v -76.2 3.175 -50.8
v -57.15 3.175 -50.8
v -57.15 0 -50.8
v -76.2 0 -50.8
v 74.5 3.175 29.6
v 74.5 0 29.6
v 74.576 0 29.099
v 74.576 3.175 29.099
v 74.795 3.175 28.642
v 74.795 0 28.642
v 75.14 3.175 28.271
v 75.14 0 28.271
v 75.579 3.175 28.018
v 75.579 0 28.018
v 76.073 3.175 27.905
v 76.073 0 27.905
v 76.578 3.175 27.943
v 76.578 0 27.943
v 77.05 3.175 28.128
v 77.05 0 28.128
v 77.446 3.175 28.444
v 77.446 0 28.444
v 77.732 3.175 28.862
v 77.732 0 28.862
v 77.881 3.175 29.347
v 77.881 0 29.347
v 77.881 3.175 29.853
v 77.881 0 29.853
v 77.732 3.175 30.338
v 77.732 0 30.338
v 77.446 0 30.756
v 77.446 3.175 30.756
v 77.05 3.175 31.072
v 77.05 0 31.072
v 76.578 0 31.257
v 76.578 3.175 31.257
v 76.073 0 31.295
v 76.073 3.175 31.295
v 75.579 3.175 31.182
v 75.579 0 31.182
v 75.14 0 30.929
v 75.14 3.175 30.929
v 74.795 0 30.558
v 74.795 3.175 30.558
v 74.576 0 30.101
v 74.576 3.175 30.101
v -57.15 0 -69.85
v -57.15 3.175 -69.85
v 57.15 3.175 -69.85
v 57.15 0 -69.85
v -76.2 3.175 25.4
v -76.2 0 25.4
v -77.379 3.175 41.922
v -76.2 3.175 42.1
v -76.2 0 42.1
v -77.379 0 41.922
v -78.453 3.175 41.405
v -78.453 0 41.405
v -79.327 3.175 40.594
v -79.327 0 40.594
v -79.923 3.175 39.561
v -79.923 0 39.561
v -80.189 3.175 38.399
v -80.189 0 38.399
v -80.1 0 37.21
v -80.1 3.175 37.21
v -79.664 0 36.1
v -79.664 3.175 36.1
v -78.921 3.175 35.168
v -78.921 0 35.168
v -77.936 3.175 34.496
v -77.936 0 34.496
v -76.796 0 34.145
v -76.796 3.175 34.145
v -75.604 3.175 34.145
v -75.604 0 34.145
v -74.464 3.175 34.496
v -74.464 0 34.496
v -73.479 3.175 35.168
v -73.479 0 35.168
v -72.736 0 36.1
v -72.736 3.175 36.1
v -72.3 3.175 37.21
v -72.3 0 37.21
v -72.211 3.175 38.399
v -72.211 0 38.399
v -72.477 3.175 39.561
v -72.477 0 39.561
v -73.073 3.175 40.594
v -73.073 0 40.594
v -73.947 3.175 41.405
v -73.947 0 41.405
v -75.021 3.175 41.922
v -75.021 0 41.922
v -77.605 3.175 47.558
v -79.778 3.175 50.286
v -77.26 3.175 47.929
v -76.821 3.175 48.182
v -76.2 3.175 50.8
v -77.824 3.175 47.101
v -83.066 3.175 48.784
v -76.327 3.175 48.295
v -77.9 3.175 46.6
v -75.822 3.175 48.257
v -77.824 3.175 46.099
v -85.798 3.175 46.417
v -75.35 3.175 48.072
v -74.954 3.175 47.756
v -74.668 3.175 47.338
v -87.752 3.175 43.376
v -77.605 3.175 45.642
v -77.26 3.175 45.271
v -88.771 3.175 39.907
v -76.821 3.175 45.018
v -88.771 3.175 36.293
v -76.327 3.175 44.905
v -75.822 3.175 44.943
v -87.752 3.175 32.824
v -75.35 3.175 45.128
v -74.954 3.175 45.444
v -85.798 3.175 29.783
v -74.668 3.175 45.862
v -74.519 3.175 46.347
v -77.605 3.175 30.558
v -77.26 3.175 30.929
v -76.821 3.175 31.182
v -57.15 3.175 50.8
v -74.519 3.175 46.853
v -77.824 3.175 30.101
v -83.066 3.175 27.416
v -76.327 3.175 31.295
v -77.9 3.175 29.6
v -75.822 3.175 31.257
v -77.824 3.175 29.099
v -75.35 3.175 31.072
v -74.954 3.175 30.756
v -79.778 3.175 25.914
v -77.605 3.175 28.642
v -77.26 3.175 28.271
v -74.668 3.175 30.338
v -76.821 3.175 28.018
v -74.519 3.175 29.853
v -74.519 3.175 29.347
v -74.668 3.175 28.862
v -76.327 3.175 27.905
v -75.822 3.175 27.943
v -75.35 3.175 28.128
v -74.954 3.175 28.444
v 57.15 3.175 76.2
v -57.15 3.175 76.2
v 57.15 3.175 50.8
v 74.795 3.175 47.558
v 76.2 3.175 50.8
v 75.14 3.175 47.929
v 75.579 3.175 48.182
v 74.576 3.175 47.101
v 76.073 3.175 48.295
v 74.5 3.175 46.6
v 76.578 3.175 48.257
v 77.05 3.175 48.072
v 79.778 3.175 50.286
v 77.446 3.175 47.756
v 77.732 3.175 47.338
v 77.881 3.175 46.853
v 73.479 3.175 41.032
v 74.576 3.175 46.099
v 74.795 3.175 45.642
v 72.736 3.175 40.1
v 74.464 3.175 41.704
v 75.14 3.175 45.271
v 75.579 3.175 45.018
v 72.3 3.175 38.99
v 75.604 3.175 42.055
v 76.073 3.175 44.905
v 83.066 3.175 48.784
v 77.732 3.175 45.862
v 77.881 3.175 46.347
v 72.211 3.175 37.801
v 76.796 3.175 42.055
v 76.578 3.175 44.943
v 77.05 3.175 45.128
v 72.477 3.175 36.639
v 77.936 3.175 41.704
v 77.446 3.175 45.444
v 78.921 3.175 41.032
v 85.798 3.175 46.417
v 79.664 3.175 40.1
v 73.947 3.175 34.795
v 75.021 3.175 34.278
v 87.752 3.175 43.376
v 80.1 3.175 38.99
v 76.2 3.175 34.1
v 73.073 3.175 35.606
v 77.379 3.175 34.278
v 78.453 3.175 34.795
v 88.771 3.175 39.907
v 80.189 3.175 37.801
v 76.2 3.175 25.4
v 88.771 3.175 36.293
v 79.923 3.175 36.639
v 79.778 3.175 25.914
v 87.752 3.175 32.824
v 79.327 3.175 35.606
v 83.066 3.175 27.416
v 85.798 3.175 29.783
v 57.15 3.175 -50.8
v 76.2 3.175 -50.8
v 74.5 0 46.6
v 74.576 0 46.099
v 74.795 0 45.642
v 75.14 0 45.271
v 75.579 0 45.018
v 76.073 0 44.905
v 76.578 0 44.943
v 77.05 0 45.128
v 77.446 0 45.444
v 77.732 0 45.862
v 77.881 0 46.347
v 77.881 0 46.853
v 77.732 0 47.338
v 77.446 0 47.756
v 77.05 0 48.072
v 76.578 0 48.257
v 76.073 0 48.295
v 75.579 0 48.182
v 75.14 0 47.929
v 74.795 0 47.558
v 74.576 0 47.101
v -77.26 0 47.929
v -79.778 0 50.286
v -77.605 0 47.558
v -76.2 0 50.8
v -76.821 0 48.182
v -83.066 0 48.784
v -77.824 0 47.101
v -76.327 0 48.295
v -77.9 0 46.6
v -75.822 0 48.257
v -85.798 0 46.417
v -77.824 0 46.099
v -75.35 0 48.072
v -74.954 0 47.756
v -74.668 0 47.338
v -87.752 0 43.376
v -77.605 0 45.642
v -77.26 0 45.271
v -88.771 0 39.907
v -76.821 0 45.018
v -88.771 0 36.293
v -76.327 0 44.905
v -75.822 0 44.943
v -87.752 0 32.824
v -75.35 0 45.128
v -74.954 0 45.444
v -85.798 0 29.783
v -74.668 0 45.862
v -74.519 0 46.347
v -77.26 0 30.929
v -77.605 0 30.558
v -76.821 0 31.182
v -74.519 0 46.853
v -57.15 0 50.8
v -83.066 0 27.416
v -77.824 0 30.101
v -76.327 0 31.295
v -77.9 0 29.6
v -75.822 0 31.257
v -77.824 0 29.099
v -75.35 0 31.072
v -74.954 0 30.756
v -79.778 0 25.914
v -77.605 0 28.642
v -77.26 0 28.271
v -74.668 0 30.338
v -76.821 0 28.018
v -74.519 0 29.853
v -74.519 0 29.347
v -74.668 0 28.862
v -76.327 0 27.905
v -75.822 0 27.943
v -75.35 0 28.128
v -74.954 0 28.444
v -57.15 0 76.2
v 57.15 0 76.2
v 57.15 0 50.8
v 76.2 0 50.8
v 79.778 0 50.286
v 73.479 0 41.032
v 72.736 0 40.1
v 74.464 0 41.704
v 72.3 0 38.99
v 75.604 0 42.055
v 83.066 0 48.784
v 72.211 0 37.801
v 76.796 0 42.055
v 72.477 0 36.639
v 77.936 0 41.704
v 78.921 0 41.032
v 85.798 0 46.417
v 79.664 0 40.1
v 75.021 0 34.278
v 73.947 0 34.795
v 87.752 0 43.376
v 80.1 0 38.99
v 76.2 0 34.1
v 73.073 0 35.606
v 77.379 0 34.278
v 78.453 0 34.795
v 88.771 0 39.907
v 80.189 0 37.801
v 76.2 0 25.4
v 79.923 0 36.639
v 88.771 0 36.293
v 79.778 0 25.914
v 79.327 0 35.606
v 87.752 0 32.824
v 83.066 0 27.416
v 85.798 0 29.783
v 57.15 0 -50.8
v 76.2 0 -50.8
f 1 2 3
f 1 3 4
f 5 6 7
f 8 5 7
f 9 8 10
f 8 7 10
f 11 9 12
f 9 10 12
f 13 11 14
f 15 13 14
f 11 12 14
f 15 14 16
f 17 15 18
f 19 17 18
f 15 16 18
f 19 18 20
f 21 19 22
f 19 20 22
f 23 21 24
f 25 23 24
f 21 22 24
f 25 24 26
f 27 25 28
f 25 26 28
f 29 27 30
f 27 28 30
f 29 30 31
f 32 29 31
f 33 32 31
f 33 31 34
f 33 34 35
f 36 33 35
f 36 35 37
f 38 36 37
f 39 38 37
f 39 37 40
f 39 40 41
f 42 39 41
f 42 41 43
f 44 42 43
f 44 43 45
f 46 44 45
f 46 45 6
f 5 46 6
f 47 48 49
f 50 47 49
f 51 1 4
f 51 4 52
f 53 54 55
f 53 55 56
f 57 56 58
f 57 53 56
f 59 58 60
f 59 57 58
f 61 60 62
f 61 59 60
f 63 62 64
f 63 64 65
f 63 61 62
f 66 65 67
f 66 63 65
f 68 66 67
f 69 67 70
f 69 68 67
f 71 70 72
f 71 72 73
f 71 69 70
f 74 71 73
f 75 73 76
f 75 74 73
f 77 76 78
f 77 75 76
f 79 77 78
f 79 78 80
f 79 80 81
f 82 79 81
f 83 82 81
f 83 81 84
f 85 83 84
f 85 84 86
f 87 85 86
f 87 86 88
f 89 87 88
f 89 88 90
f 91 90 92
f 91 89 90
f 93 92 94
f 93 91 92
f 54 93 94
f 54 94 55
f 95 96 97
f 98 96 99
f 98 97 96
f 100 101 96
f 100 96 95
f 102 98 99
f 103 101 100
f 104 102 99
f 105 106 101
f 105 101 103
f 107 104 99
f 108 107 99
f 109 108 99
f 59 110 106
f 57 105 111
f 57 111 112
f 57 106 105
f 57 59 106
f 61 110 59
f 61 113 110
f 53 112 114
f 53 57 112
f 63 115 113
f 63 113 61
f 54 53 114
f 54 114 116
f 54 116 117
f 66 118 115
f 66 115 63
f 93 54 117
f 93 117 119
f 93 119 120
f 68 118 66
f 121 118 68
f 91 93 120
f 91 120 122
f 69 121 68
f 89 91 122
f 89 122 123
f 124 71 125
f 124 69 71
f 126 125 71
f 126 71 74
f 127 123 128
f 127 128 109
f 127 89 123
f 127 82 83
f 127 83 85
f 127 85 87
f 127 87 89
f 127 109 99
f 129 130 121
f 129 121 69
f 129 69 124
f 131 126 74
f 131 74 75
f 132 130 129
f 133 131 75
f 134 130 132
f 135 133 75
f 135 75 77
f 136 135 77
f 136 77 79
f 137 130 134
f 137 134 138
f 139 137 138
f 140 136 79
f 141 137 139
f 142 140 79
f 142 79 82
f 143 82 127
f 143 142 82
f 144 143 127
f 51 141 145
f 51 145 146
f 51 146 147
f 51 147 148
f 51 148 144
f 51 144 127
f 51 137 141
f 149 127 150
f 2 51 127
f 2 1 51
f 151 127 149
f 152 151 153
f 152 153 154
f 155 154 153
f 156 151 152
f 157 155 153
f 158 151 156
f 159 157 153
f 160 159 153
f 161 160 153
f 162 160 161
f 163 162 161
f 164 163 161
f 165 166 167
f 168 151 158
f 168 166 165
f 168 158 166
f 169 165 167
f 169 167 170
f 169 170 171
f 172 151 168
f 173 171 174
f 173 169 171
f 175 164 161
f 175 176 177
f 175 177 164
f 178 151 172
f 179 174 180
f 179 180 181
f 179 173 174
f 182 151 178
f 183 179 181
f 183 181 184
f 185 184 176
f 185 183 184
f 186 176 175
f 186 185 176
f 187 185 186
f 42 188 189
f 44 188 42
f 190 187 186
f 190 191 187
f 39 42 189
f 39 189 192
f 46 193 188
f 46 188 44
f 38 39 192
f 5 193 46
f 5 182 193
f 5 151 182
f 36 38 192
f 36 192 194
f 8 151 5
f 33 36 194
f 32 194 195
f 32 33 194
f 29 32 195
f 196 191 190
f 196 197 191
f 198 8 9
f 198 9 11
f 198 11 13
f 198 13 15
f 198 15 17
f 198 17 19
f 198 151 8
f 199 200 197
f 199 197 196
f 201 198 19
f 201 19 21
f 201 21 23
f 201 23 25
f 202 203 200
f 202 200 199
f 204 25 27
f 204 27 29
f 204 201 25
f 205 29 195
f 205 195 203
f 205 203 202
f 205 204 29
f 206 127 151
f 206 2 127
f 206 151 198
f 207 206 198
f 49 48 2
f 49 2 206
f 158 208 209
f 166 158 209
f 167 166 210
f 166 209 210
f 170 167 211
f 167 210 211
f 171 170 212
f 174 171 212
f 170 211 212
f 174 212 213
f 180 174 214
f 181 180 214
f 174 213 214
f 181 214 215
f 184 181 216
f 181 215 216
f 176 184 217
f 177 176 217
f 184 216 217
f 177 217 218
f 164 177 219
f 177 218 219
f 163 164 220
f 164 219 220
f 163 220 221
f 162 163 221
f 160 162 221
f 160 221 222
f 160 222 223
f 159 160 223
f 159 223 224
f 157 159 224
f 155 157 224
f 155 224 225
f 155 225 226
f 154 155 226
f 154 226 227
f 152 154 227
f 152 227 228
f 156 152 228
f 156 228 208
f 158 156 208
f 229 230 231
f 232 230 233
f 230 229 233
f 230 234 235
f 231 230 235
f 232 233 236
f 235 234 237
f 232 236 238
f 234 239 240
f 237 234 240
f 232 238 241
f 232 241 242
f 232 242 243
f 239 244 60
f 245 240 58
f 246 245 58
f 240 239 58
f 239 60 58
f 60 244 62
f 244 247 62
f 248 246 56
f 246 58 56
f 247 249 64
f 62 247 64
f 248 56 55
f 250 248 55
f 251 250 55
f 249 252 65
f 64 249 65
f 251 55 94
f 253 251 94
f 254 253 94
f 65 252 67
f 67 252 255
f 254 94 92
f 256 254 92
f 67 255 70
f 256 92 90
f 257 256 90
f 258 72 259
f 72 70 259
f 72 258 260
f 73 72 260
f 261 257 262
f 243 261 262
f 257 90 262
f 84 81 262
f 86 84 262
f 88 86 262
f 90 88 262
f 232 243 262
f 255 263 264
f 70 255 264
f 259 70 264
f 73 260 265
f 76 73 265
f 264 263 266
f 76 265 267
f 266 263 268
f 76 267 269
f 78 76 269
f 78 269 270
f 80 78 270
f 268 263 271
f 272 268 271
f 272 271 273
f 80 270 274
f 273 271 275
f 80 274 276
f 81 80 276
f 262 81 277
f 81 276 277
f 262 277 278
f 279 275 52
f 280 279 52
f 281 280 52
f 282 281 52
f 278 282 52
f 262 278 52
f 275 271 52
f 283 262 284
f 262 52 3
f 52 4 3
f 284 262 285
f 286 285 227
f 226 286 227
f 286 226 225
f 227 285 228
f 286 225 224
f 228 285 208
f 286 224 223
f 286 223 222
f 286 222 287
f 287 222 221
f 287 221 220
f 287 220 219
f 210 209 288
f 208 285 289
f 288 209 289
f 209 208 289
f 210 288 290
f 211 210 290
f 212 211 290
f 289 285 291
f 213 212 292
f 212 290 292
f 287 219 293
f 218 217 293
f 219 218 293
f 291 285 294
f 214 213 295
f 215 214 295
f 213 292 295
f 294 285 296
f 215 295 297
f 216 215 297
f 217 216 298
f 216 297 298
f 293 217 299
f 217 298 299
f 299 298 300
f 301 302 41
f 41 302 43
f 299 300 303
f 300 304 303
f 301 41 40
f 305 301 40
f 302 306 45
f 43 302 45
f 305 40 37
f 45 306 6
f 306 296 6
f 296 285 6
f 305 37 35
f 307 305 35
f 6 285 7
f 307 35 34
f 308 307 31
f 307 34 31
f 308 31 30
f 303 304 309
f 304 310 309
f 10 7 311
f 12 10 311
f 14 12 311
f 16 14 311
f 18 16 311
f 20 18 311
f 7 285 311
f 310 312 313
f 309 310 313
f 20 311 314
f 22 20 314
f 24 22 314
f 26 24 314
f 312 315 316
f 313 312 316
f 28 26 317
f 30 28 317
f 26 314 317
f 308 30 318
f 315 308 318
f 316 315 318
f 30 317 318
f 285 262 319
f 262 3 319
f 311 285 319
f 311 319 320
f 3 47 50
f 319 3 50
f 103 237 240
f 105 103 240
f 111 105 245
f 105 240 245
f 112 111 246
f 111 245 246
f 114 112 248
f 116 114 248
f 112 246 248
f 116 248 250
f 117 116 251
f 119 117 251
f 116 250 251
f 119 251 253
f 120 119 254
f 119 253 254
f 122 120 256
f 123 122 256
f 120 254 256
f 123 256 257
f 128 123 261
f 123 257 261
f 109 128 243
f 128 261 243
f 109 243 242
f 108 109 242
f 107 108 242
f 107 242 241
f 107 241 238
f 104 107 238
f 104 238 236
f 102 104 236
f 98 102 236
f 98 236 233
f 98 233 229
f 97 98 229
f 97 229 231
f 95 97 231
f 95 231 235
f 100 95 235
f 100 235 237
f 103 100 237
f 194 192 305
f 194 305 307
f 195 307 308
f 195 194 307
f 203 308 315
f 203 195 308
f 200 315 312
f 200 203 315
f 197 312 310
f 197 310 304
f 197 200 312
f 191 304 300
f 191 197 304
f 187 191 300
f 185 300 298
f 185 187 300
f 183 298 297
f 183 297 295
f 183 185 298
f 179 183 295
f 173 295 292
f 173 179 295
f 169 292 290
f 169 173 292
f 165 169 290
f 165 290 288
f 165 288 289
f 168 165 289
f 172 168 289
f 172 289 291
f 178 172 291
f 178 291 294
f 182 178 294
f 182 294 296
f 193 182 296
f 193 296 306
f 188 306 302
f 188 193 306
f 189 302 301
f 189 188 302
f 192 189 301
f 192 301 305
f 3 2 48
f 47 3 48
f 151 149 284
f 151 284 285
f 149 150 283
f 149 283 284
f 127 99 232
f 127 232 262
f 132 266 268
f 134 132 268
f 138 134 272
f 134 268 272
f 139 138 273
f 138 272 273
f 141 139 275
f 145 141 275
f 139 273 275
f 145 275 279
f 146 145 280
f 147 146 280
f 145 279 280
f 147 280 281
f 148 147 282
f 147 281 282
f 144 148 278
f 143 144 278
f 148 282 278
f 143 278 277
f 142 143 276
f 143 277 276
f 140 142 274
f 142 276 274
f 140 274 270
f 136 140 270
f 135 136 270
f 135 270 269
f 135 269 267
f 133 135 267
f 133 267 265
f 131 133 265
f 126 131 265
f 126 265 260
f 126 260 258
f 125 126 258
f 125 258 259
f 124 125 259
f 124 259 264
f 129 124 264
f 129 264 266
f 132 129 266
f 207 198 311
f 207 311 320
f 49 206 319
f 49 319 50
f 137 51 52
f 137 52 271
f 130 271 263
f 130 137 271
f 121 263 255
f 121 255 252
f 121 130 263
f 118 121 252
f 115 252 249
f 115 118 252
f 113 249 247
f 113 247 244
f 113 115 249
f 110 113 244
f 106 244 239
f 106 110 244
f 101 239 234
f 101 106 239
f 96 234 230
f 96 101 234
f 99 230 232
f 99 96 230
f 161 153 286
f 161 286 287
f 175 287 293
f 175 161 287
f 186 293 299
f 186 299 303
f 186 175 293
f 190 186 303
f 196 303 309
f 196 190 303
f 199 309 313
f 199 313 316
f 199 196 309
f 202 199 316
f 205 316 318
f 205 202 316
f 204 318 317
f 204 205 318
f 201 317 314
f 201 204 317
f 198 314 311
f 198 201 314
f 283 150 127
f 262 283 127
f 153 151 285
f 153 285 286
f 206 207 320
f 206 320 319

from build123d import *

# Parameters (mm, degrees)
SKETCH1_W                = 114.3
SKETCH1_H                = 101.6
BOSS_EXTRUDE1_DEPTH      = 3.175
SKETCH2_W                = 114.3
SKETCH2_H                = 25.4
SKETCH2_H_2              = 19.05
BOSS_EXTRUDE2_DEPTH      = 3.175
M3_CLEARANCE_HOLE1_D     = 3.4
M3_CLEARANCE_HOLE1_DEPTH = 6.35
M3_CLEARANCE_HOLE1_TIP   = 1.021463052


with BuildPart() as part:
    # Sketch1 → Boss-Extrude1 (new body)
    with BuildSketch(Plane(origin=(0, 0, 0), x_dir=(1, 0, 0), z_dir=(0, 1, 0))):
        Rectangle(SKETCH1_W, SKETCH1_H)
    extrude(amount=BOSS_EXTRUDE1_DEPTH)

    # Sketch2 → Boss-Extrude2 (add)
    # profile 1 of 4: a face of its own
    with BuildSketch(Plane(origin=(0, 3.175, 0), x_dir=(1, 0, 0), z_dir=(0, 1, 0))):
        with BuildLine():
            Line((-76.2, -50.8), (-57.15, -50.8))
            Line((-57.15, -50.8), (-57.15, 50.8))
            Line((-57.15, 50.8), (-76.2, 50.8))
            Line((-76.2, 50.8), (-76.2, -25.4))
            ThreePointArc((-76.2, -25.4), (-88.9, -38.1), (-76.2, -50.8))
        make_face()
        with BuildLine():
            ThreePointArc((-76.2, -34.1), (-72.2, -38.1), (-76.2, -42.1))
            ThreePointArc((-76.2, -42.1), (-80.2, -38.1), (-76.2, -34.1))
        make_face(mode=Mode.SUBTRACT)
    # profile 2 of 4: a face of its own
    with BuildSketch(Plane(origin=(0, 3.175, 0), x_dir=(1, 0, 0), z_dir=(0, 1, 0))):
        with Locations((0, -63.5)):
            Rectangle(SKETCH2_W, SKETCH2_H)
    # profile 3 of 4: a face of its own
    with BuildSketch(Plane(origin=(0, 3.175, 0), x_dir=(1, 0, 0), z_dir=(0, 1, 0))):
        with BuildLine():
            Line((57.15, -50.8), (76.2, -50.8))
            ThreePointArc((76.2, -50.8), (88.9, -38.1), (76.2, -25.4))
            Line((76.2, -25.4), (76.2, 50.8))
            Line((76.2, 50.8), (57.15, 50.8))
            Line((57.15, 50.8), (57.15, -50.8))
        make_face()
        with BuildLine():
            ThreePointArc((76.2, -42.1), (72.2, -38.1), (76.2, -34.1))
            ThreePointArc((76.2, -34.1), (80.2, -38.1), (76.2, -42.1))
        make_face(mode=Mode.SUBTRACT)
    # profile 4 of 4: a face of its own
    with BuildSketch(Plane(origin=(0, 3.175, 0), x_dir=(1, 0, 0), z_dir=(0, 1, 0))):
        with Locations((0, 60.325)):
            Rectangle(SKETCH2_W, SKETCH2_H_2)
    extrude(amount=-BOSS_EXTRUDE2_DEPTH)

    # M3 Clearance Hole1
    with Locations(Plane(origin=(0, 3.175, 0), x_dir=(1, 0, 0), z_dir=(0, 1, 0))):
        with Locations((-76.2, -29.6), (-76.2, -46.6), (76.2, -29.6), (76.2, -46.6)):
            Hole(M3_CLEARANCE_HOLE1_D / 2, depth=M3_CLEARANCE_HOLE1_DEPTH)
            with Locations((0, 0, -(M3_CLEARANCE_HOLE1_DEPTH + M3_CLEARANCE_HOLE1_TIP / 2))):  # 118° drill point
                Cone(0, M3_CLEARANCE_HOLE1_D / 2, M3_CLEARANCE_HOLE1_TIP, mode=Mode.SUBTRACT)


solid = part.part
